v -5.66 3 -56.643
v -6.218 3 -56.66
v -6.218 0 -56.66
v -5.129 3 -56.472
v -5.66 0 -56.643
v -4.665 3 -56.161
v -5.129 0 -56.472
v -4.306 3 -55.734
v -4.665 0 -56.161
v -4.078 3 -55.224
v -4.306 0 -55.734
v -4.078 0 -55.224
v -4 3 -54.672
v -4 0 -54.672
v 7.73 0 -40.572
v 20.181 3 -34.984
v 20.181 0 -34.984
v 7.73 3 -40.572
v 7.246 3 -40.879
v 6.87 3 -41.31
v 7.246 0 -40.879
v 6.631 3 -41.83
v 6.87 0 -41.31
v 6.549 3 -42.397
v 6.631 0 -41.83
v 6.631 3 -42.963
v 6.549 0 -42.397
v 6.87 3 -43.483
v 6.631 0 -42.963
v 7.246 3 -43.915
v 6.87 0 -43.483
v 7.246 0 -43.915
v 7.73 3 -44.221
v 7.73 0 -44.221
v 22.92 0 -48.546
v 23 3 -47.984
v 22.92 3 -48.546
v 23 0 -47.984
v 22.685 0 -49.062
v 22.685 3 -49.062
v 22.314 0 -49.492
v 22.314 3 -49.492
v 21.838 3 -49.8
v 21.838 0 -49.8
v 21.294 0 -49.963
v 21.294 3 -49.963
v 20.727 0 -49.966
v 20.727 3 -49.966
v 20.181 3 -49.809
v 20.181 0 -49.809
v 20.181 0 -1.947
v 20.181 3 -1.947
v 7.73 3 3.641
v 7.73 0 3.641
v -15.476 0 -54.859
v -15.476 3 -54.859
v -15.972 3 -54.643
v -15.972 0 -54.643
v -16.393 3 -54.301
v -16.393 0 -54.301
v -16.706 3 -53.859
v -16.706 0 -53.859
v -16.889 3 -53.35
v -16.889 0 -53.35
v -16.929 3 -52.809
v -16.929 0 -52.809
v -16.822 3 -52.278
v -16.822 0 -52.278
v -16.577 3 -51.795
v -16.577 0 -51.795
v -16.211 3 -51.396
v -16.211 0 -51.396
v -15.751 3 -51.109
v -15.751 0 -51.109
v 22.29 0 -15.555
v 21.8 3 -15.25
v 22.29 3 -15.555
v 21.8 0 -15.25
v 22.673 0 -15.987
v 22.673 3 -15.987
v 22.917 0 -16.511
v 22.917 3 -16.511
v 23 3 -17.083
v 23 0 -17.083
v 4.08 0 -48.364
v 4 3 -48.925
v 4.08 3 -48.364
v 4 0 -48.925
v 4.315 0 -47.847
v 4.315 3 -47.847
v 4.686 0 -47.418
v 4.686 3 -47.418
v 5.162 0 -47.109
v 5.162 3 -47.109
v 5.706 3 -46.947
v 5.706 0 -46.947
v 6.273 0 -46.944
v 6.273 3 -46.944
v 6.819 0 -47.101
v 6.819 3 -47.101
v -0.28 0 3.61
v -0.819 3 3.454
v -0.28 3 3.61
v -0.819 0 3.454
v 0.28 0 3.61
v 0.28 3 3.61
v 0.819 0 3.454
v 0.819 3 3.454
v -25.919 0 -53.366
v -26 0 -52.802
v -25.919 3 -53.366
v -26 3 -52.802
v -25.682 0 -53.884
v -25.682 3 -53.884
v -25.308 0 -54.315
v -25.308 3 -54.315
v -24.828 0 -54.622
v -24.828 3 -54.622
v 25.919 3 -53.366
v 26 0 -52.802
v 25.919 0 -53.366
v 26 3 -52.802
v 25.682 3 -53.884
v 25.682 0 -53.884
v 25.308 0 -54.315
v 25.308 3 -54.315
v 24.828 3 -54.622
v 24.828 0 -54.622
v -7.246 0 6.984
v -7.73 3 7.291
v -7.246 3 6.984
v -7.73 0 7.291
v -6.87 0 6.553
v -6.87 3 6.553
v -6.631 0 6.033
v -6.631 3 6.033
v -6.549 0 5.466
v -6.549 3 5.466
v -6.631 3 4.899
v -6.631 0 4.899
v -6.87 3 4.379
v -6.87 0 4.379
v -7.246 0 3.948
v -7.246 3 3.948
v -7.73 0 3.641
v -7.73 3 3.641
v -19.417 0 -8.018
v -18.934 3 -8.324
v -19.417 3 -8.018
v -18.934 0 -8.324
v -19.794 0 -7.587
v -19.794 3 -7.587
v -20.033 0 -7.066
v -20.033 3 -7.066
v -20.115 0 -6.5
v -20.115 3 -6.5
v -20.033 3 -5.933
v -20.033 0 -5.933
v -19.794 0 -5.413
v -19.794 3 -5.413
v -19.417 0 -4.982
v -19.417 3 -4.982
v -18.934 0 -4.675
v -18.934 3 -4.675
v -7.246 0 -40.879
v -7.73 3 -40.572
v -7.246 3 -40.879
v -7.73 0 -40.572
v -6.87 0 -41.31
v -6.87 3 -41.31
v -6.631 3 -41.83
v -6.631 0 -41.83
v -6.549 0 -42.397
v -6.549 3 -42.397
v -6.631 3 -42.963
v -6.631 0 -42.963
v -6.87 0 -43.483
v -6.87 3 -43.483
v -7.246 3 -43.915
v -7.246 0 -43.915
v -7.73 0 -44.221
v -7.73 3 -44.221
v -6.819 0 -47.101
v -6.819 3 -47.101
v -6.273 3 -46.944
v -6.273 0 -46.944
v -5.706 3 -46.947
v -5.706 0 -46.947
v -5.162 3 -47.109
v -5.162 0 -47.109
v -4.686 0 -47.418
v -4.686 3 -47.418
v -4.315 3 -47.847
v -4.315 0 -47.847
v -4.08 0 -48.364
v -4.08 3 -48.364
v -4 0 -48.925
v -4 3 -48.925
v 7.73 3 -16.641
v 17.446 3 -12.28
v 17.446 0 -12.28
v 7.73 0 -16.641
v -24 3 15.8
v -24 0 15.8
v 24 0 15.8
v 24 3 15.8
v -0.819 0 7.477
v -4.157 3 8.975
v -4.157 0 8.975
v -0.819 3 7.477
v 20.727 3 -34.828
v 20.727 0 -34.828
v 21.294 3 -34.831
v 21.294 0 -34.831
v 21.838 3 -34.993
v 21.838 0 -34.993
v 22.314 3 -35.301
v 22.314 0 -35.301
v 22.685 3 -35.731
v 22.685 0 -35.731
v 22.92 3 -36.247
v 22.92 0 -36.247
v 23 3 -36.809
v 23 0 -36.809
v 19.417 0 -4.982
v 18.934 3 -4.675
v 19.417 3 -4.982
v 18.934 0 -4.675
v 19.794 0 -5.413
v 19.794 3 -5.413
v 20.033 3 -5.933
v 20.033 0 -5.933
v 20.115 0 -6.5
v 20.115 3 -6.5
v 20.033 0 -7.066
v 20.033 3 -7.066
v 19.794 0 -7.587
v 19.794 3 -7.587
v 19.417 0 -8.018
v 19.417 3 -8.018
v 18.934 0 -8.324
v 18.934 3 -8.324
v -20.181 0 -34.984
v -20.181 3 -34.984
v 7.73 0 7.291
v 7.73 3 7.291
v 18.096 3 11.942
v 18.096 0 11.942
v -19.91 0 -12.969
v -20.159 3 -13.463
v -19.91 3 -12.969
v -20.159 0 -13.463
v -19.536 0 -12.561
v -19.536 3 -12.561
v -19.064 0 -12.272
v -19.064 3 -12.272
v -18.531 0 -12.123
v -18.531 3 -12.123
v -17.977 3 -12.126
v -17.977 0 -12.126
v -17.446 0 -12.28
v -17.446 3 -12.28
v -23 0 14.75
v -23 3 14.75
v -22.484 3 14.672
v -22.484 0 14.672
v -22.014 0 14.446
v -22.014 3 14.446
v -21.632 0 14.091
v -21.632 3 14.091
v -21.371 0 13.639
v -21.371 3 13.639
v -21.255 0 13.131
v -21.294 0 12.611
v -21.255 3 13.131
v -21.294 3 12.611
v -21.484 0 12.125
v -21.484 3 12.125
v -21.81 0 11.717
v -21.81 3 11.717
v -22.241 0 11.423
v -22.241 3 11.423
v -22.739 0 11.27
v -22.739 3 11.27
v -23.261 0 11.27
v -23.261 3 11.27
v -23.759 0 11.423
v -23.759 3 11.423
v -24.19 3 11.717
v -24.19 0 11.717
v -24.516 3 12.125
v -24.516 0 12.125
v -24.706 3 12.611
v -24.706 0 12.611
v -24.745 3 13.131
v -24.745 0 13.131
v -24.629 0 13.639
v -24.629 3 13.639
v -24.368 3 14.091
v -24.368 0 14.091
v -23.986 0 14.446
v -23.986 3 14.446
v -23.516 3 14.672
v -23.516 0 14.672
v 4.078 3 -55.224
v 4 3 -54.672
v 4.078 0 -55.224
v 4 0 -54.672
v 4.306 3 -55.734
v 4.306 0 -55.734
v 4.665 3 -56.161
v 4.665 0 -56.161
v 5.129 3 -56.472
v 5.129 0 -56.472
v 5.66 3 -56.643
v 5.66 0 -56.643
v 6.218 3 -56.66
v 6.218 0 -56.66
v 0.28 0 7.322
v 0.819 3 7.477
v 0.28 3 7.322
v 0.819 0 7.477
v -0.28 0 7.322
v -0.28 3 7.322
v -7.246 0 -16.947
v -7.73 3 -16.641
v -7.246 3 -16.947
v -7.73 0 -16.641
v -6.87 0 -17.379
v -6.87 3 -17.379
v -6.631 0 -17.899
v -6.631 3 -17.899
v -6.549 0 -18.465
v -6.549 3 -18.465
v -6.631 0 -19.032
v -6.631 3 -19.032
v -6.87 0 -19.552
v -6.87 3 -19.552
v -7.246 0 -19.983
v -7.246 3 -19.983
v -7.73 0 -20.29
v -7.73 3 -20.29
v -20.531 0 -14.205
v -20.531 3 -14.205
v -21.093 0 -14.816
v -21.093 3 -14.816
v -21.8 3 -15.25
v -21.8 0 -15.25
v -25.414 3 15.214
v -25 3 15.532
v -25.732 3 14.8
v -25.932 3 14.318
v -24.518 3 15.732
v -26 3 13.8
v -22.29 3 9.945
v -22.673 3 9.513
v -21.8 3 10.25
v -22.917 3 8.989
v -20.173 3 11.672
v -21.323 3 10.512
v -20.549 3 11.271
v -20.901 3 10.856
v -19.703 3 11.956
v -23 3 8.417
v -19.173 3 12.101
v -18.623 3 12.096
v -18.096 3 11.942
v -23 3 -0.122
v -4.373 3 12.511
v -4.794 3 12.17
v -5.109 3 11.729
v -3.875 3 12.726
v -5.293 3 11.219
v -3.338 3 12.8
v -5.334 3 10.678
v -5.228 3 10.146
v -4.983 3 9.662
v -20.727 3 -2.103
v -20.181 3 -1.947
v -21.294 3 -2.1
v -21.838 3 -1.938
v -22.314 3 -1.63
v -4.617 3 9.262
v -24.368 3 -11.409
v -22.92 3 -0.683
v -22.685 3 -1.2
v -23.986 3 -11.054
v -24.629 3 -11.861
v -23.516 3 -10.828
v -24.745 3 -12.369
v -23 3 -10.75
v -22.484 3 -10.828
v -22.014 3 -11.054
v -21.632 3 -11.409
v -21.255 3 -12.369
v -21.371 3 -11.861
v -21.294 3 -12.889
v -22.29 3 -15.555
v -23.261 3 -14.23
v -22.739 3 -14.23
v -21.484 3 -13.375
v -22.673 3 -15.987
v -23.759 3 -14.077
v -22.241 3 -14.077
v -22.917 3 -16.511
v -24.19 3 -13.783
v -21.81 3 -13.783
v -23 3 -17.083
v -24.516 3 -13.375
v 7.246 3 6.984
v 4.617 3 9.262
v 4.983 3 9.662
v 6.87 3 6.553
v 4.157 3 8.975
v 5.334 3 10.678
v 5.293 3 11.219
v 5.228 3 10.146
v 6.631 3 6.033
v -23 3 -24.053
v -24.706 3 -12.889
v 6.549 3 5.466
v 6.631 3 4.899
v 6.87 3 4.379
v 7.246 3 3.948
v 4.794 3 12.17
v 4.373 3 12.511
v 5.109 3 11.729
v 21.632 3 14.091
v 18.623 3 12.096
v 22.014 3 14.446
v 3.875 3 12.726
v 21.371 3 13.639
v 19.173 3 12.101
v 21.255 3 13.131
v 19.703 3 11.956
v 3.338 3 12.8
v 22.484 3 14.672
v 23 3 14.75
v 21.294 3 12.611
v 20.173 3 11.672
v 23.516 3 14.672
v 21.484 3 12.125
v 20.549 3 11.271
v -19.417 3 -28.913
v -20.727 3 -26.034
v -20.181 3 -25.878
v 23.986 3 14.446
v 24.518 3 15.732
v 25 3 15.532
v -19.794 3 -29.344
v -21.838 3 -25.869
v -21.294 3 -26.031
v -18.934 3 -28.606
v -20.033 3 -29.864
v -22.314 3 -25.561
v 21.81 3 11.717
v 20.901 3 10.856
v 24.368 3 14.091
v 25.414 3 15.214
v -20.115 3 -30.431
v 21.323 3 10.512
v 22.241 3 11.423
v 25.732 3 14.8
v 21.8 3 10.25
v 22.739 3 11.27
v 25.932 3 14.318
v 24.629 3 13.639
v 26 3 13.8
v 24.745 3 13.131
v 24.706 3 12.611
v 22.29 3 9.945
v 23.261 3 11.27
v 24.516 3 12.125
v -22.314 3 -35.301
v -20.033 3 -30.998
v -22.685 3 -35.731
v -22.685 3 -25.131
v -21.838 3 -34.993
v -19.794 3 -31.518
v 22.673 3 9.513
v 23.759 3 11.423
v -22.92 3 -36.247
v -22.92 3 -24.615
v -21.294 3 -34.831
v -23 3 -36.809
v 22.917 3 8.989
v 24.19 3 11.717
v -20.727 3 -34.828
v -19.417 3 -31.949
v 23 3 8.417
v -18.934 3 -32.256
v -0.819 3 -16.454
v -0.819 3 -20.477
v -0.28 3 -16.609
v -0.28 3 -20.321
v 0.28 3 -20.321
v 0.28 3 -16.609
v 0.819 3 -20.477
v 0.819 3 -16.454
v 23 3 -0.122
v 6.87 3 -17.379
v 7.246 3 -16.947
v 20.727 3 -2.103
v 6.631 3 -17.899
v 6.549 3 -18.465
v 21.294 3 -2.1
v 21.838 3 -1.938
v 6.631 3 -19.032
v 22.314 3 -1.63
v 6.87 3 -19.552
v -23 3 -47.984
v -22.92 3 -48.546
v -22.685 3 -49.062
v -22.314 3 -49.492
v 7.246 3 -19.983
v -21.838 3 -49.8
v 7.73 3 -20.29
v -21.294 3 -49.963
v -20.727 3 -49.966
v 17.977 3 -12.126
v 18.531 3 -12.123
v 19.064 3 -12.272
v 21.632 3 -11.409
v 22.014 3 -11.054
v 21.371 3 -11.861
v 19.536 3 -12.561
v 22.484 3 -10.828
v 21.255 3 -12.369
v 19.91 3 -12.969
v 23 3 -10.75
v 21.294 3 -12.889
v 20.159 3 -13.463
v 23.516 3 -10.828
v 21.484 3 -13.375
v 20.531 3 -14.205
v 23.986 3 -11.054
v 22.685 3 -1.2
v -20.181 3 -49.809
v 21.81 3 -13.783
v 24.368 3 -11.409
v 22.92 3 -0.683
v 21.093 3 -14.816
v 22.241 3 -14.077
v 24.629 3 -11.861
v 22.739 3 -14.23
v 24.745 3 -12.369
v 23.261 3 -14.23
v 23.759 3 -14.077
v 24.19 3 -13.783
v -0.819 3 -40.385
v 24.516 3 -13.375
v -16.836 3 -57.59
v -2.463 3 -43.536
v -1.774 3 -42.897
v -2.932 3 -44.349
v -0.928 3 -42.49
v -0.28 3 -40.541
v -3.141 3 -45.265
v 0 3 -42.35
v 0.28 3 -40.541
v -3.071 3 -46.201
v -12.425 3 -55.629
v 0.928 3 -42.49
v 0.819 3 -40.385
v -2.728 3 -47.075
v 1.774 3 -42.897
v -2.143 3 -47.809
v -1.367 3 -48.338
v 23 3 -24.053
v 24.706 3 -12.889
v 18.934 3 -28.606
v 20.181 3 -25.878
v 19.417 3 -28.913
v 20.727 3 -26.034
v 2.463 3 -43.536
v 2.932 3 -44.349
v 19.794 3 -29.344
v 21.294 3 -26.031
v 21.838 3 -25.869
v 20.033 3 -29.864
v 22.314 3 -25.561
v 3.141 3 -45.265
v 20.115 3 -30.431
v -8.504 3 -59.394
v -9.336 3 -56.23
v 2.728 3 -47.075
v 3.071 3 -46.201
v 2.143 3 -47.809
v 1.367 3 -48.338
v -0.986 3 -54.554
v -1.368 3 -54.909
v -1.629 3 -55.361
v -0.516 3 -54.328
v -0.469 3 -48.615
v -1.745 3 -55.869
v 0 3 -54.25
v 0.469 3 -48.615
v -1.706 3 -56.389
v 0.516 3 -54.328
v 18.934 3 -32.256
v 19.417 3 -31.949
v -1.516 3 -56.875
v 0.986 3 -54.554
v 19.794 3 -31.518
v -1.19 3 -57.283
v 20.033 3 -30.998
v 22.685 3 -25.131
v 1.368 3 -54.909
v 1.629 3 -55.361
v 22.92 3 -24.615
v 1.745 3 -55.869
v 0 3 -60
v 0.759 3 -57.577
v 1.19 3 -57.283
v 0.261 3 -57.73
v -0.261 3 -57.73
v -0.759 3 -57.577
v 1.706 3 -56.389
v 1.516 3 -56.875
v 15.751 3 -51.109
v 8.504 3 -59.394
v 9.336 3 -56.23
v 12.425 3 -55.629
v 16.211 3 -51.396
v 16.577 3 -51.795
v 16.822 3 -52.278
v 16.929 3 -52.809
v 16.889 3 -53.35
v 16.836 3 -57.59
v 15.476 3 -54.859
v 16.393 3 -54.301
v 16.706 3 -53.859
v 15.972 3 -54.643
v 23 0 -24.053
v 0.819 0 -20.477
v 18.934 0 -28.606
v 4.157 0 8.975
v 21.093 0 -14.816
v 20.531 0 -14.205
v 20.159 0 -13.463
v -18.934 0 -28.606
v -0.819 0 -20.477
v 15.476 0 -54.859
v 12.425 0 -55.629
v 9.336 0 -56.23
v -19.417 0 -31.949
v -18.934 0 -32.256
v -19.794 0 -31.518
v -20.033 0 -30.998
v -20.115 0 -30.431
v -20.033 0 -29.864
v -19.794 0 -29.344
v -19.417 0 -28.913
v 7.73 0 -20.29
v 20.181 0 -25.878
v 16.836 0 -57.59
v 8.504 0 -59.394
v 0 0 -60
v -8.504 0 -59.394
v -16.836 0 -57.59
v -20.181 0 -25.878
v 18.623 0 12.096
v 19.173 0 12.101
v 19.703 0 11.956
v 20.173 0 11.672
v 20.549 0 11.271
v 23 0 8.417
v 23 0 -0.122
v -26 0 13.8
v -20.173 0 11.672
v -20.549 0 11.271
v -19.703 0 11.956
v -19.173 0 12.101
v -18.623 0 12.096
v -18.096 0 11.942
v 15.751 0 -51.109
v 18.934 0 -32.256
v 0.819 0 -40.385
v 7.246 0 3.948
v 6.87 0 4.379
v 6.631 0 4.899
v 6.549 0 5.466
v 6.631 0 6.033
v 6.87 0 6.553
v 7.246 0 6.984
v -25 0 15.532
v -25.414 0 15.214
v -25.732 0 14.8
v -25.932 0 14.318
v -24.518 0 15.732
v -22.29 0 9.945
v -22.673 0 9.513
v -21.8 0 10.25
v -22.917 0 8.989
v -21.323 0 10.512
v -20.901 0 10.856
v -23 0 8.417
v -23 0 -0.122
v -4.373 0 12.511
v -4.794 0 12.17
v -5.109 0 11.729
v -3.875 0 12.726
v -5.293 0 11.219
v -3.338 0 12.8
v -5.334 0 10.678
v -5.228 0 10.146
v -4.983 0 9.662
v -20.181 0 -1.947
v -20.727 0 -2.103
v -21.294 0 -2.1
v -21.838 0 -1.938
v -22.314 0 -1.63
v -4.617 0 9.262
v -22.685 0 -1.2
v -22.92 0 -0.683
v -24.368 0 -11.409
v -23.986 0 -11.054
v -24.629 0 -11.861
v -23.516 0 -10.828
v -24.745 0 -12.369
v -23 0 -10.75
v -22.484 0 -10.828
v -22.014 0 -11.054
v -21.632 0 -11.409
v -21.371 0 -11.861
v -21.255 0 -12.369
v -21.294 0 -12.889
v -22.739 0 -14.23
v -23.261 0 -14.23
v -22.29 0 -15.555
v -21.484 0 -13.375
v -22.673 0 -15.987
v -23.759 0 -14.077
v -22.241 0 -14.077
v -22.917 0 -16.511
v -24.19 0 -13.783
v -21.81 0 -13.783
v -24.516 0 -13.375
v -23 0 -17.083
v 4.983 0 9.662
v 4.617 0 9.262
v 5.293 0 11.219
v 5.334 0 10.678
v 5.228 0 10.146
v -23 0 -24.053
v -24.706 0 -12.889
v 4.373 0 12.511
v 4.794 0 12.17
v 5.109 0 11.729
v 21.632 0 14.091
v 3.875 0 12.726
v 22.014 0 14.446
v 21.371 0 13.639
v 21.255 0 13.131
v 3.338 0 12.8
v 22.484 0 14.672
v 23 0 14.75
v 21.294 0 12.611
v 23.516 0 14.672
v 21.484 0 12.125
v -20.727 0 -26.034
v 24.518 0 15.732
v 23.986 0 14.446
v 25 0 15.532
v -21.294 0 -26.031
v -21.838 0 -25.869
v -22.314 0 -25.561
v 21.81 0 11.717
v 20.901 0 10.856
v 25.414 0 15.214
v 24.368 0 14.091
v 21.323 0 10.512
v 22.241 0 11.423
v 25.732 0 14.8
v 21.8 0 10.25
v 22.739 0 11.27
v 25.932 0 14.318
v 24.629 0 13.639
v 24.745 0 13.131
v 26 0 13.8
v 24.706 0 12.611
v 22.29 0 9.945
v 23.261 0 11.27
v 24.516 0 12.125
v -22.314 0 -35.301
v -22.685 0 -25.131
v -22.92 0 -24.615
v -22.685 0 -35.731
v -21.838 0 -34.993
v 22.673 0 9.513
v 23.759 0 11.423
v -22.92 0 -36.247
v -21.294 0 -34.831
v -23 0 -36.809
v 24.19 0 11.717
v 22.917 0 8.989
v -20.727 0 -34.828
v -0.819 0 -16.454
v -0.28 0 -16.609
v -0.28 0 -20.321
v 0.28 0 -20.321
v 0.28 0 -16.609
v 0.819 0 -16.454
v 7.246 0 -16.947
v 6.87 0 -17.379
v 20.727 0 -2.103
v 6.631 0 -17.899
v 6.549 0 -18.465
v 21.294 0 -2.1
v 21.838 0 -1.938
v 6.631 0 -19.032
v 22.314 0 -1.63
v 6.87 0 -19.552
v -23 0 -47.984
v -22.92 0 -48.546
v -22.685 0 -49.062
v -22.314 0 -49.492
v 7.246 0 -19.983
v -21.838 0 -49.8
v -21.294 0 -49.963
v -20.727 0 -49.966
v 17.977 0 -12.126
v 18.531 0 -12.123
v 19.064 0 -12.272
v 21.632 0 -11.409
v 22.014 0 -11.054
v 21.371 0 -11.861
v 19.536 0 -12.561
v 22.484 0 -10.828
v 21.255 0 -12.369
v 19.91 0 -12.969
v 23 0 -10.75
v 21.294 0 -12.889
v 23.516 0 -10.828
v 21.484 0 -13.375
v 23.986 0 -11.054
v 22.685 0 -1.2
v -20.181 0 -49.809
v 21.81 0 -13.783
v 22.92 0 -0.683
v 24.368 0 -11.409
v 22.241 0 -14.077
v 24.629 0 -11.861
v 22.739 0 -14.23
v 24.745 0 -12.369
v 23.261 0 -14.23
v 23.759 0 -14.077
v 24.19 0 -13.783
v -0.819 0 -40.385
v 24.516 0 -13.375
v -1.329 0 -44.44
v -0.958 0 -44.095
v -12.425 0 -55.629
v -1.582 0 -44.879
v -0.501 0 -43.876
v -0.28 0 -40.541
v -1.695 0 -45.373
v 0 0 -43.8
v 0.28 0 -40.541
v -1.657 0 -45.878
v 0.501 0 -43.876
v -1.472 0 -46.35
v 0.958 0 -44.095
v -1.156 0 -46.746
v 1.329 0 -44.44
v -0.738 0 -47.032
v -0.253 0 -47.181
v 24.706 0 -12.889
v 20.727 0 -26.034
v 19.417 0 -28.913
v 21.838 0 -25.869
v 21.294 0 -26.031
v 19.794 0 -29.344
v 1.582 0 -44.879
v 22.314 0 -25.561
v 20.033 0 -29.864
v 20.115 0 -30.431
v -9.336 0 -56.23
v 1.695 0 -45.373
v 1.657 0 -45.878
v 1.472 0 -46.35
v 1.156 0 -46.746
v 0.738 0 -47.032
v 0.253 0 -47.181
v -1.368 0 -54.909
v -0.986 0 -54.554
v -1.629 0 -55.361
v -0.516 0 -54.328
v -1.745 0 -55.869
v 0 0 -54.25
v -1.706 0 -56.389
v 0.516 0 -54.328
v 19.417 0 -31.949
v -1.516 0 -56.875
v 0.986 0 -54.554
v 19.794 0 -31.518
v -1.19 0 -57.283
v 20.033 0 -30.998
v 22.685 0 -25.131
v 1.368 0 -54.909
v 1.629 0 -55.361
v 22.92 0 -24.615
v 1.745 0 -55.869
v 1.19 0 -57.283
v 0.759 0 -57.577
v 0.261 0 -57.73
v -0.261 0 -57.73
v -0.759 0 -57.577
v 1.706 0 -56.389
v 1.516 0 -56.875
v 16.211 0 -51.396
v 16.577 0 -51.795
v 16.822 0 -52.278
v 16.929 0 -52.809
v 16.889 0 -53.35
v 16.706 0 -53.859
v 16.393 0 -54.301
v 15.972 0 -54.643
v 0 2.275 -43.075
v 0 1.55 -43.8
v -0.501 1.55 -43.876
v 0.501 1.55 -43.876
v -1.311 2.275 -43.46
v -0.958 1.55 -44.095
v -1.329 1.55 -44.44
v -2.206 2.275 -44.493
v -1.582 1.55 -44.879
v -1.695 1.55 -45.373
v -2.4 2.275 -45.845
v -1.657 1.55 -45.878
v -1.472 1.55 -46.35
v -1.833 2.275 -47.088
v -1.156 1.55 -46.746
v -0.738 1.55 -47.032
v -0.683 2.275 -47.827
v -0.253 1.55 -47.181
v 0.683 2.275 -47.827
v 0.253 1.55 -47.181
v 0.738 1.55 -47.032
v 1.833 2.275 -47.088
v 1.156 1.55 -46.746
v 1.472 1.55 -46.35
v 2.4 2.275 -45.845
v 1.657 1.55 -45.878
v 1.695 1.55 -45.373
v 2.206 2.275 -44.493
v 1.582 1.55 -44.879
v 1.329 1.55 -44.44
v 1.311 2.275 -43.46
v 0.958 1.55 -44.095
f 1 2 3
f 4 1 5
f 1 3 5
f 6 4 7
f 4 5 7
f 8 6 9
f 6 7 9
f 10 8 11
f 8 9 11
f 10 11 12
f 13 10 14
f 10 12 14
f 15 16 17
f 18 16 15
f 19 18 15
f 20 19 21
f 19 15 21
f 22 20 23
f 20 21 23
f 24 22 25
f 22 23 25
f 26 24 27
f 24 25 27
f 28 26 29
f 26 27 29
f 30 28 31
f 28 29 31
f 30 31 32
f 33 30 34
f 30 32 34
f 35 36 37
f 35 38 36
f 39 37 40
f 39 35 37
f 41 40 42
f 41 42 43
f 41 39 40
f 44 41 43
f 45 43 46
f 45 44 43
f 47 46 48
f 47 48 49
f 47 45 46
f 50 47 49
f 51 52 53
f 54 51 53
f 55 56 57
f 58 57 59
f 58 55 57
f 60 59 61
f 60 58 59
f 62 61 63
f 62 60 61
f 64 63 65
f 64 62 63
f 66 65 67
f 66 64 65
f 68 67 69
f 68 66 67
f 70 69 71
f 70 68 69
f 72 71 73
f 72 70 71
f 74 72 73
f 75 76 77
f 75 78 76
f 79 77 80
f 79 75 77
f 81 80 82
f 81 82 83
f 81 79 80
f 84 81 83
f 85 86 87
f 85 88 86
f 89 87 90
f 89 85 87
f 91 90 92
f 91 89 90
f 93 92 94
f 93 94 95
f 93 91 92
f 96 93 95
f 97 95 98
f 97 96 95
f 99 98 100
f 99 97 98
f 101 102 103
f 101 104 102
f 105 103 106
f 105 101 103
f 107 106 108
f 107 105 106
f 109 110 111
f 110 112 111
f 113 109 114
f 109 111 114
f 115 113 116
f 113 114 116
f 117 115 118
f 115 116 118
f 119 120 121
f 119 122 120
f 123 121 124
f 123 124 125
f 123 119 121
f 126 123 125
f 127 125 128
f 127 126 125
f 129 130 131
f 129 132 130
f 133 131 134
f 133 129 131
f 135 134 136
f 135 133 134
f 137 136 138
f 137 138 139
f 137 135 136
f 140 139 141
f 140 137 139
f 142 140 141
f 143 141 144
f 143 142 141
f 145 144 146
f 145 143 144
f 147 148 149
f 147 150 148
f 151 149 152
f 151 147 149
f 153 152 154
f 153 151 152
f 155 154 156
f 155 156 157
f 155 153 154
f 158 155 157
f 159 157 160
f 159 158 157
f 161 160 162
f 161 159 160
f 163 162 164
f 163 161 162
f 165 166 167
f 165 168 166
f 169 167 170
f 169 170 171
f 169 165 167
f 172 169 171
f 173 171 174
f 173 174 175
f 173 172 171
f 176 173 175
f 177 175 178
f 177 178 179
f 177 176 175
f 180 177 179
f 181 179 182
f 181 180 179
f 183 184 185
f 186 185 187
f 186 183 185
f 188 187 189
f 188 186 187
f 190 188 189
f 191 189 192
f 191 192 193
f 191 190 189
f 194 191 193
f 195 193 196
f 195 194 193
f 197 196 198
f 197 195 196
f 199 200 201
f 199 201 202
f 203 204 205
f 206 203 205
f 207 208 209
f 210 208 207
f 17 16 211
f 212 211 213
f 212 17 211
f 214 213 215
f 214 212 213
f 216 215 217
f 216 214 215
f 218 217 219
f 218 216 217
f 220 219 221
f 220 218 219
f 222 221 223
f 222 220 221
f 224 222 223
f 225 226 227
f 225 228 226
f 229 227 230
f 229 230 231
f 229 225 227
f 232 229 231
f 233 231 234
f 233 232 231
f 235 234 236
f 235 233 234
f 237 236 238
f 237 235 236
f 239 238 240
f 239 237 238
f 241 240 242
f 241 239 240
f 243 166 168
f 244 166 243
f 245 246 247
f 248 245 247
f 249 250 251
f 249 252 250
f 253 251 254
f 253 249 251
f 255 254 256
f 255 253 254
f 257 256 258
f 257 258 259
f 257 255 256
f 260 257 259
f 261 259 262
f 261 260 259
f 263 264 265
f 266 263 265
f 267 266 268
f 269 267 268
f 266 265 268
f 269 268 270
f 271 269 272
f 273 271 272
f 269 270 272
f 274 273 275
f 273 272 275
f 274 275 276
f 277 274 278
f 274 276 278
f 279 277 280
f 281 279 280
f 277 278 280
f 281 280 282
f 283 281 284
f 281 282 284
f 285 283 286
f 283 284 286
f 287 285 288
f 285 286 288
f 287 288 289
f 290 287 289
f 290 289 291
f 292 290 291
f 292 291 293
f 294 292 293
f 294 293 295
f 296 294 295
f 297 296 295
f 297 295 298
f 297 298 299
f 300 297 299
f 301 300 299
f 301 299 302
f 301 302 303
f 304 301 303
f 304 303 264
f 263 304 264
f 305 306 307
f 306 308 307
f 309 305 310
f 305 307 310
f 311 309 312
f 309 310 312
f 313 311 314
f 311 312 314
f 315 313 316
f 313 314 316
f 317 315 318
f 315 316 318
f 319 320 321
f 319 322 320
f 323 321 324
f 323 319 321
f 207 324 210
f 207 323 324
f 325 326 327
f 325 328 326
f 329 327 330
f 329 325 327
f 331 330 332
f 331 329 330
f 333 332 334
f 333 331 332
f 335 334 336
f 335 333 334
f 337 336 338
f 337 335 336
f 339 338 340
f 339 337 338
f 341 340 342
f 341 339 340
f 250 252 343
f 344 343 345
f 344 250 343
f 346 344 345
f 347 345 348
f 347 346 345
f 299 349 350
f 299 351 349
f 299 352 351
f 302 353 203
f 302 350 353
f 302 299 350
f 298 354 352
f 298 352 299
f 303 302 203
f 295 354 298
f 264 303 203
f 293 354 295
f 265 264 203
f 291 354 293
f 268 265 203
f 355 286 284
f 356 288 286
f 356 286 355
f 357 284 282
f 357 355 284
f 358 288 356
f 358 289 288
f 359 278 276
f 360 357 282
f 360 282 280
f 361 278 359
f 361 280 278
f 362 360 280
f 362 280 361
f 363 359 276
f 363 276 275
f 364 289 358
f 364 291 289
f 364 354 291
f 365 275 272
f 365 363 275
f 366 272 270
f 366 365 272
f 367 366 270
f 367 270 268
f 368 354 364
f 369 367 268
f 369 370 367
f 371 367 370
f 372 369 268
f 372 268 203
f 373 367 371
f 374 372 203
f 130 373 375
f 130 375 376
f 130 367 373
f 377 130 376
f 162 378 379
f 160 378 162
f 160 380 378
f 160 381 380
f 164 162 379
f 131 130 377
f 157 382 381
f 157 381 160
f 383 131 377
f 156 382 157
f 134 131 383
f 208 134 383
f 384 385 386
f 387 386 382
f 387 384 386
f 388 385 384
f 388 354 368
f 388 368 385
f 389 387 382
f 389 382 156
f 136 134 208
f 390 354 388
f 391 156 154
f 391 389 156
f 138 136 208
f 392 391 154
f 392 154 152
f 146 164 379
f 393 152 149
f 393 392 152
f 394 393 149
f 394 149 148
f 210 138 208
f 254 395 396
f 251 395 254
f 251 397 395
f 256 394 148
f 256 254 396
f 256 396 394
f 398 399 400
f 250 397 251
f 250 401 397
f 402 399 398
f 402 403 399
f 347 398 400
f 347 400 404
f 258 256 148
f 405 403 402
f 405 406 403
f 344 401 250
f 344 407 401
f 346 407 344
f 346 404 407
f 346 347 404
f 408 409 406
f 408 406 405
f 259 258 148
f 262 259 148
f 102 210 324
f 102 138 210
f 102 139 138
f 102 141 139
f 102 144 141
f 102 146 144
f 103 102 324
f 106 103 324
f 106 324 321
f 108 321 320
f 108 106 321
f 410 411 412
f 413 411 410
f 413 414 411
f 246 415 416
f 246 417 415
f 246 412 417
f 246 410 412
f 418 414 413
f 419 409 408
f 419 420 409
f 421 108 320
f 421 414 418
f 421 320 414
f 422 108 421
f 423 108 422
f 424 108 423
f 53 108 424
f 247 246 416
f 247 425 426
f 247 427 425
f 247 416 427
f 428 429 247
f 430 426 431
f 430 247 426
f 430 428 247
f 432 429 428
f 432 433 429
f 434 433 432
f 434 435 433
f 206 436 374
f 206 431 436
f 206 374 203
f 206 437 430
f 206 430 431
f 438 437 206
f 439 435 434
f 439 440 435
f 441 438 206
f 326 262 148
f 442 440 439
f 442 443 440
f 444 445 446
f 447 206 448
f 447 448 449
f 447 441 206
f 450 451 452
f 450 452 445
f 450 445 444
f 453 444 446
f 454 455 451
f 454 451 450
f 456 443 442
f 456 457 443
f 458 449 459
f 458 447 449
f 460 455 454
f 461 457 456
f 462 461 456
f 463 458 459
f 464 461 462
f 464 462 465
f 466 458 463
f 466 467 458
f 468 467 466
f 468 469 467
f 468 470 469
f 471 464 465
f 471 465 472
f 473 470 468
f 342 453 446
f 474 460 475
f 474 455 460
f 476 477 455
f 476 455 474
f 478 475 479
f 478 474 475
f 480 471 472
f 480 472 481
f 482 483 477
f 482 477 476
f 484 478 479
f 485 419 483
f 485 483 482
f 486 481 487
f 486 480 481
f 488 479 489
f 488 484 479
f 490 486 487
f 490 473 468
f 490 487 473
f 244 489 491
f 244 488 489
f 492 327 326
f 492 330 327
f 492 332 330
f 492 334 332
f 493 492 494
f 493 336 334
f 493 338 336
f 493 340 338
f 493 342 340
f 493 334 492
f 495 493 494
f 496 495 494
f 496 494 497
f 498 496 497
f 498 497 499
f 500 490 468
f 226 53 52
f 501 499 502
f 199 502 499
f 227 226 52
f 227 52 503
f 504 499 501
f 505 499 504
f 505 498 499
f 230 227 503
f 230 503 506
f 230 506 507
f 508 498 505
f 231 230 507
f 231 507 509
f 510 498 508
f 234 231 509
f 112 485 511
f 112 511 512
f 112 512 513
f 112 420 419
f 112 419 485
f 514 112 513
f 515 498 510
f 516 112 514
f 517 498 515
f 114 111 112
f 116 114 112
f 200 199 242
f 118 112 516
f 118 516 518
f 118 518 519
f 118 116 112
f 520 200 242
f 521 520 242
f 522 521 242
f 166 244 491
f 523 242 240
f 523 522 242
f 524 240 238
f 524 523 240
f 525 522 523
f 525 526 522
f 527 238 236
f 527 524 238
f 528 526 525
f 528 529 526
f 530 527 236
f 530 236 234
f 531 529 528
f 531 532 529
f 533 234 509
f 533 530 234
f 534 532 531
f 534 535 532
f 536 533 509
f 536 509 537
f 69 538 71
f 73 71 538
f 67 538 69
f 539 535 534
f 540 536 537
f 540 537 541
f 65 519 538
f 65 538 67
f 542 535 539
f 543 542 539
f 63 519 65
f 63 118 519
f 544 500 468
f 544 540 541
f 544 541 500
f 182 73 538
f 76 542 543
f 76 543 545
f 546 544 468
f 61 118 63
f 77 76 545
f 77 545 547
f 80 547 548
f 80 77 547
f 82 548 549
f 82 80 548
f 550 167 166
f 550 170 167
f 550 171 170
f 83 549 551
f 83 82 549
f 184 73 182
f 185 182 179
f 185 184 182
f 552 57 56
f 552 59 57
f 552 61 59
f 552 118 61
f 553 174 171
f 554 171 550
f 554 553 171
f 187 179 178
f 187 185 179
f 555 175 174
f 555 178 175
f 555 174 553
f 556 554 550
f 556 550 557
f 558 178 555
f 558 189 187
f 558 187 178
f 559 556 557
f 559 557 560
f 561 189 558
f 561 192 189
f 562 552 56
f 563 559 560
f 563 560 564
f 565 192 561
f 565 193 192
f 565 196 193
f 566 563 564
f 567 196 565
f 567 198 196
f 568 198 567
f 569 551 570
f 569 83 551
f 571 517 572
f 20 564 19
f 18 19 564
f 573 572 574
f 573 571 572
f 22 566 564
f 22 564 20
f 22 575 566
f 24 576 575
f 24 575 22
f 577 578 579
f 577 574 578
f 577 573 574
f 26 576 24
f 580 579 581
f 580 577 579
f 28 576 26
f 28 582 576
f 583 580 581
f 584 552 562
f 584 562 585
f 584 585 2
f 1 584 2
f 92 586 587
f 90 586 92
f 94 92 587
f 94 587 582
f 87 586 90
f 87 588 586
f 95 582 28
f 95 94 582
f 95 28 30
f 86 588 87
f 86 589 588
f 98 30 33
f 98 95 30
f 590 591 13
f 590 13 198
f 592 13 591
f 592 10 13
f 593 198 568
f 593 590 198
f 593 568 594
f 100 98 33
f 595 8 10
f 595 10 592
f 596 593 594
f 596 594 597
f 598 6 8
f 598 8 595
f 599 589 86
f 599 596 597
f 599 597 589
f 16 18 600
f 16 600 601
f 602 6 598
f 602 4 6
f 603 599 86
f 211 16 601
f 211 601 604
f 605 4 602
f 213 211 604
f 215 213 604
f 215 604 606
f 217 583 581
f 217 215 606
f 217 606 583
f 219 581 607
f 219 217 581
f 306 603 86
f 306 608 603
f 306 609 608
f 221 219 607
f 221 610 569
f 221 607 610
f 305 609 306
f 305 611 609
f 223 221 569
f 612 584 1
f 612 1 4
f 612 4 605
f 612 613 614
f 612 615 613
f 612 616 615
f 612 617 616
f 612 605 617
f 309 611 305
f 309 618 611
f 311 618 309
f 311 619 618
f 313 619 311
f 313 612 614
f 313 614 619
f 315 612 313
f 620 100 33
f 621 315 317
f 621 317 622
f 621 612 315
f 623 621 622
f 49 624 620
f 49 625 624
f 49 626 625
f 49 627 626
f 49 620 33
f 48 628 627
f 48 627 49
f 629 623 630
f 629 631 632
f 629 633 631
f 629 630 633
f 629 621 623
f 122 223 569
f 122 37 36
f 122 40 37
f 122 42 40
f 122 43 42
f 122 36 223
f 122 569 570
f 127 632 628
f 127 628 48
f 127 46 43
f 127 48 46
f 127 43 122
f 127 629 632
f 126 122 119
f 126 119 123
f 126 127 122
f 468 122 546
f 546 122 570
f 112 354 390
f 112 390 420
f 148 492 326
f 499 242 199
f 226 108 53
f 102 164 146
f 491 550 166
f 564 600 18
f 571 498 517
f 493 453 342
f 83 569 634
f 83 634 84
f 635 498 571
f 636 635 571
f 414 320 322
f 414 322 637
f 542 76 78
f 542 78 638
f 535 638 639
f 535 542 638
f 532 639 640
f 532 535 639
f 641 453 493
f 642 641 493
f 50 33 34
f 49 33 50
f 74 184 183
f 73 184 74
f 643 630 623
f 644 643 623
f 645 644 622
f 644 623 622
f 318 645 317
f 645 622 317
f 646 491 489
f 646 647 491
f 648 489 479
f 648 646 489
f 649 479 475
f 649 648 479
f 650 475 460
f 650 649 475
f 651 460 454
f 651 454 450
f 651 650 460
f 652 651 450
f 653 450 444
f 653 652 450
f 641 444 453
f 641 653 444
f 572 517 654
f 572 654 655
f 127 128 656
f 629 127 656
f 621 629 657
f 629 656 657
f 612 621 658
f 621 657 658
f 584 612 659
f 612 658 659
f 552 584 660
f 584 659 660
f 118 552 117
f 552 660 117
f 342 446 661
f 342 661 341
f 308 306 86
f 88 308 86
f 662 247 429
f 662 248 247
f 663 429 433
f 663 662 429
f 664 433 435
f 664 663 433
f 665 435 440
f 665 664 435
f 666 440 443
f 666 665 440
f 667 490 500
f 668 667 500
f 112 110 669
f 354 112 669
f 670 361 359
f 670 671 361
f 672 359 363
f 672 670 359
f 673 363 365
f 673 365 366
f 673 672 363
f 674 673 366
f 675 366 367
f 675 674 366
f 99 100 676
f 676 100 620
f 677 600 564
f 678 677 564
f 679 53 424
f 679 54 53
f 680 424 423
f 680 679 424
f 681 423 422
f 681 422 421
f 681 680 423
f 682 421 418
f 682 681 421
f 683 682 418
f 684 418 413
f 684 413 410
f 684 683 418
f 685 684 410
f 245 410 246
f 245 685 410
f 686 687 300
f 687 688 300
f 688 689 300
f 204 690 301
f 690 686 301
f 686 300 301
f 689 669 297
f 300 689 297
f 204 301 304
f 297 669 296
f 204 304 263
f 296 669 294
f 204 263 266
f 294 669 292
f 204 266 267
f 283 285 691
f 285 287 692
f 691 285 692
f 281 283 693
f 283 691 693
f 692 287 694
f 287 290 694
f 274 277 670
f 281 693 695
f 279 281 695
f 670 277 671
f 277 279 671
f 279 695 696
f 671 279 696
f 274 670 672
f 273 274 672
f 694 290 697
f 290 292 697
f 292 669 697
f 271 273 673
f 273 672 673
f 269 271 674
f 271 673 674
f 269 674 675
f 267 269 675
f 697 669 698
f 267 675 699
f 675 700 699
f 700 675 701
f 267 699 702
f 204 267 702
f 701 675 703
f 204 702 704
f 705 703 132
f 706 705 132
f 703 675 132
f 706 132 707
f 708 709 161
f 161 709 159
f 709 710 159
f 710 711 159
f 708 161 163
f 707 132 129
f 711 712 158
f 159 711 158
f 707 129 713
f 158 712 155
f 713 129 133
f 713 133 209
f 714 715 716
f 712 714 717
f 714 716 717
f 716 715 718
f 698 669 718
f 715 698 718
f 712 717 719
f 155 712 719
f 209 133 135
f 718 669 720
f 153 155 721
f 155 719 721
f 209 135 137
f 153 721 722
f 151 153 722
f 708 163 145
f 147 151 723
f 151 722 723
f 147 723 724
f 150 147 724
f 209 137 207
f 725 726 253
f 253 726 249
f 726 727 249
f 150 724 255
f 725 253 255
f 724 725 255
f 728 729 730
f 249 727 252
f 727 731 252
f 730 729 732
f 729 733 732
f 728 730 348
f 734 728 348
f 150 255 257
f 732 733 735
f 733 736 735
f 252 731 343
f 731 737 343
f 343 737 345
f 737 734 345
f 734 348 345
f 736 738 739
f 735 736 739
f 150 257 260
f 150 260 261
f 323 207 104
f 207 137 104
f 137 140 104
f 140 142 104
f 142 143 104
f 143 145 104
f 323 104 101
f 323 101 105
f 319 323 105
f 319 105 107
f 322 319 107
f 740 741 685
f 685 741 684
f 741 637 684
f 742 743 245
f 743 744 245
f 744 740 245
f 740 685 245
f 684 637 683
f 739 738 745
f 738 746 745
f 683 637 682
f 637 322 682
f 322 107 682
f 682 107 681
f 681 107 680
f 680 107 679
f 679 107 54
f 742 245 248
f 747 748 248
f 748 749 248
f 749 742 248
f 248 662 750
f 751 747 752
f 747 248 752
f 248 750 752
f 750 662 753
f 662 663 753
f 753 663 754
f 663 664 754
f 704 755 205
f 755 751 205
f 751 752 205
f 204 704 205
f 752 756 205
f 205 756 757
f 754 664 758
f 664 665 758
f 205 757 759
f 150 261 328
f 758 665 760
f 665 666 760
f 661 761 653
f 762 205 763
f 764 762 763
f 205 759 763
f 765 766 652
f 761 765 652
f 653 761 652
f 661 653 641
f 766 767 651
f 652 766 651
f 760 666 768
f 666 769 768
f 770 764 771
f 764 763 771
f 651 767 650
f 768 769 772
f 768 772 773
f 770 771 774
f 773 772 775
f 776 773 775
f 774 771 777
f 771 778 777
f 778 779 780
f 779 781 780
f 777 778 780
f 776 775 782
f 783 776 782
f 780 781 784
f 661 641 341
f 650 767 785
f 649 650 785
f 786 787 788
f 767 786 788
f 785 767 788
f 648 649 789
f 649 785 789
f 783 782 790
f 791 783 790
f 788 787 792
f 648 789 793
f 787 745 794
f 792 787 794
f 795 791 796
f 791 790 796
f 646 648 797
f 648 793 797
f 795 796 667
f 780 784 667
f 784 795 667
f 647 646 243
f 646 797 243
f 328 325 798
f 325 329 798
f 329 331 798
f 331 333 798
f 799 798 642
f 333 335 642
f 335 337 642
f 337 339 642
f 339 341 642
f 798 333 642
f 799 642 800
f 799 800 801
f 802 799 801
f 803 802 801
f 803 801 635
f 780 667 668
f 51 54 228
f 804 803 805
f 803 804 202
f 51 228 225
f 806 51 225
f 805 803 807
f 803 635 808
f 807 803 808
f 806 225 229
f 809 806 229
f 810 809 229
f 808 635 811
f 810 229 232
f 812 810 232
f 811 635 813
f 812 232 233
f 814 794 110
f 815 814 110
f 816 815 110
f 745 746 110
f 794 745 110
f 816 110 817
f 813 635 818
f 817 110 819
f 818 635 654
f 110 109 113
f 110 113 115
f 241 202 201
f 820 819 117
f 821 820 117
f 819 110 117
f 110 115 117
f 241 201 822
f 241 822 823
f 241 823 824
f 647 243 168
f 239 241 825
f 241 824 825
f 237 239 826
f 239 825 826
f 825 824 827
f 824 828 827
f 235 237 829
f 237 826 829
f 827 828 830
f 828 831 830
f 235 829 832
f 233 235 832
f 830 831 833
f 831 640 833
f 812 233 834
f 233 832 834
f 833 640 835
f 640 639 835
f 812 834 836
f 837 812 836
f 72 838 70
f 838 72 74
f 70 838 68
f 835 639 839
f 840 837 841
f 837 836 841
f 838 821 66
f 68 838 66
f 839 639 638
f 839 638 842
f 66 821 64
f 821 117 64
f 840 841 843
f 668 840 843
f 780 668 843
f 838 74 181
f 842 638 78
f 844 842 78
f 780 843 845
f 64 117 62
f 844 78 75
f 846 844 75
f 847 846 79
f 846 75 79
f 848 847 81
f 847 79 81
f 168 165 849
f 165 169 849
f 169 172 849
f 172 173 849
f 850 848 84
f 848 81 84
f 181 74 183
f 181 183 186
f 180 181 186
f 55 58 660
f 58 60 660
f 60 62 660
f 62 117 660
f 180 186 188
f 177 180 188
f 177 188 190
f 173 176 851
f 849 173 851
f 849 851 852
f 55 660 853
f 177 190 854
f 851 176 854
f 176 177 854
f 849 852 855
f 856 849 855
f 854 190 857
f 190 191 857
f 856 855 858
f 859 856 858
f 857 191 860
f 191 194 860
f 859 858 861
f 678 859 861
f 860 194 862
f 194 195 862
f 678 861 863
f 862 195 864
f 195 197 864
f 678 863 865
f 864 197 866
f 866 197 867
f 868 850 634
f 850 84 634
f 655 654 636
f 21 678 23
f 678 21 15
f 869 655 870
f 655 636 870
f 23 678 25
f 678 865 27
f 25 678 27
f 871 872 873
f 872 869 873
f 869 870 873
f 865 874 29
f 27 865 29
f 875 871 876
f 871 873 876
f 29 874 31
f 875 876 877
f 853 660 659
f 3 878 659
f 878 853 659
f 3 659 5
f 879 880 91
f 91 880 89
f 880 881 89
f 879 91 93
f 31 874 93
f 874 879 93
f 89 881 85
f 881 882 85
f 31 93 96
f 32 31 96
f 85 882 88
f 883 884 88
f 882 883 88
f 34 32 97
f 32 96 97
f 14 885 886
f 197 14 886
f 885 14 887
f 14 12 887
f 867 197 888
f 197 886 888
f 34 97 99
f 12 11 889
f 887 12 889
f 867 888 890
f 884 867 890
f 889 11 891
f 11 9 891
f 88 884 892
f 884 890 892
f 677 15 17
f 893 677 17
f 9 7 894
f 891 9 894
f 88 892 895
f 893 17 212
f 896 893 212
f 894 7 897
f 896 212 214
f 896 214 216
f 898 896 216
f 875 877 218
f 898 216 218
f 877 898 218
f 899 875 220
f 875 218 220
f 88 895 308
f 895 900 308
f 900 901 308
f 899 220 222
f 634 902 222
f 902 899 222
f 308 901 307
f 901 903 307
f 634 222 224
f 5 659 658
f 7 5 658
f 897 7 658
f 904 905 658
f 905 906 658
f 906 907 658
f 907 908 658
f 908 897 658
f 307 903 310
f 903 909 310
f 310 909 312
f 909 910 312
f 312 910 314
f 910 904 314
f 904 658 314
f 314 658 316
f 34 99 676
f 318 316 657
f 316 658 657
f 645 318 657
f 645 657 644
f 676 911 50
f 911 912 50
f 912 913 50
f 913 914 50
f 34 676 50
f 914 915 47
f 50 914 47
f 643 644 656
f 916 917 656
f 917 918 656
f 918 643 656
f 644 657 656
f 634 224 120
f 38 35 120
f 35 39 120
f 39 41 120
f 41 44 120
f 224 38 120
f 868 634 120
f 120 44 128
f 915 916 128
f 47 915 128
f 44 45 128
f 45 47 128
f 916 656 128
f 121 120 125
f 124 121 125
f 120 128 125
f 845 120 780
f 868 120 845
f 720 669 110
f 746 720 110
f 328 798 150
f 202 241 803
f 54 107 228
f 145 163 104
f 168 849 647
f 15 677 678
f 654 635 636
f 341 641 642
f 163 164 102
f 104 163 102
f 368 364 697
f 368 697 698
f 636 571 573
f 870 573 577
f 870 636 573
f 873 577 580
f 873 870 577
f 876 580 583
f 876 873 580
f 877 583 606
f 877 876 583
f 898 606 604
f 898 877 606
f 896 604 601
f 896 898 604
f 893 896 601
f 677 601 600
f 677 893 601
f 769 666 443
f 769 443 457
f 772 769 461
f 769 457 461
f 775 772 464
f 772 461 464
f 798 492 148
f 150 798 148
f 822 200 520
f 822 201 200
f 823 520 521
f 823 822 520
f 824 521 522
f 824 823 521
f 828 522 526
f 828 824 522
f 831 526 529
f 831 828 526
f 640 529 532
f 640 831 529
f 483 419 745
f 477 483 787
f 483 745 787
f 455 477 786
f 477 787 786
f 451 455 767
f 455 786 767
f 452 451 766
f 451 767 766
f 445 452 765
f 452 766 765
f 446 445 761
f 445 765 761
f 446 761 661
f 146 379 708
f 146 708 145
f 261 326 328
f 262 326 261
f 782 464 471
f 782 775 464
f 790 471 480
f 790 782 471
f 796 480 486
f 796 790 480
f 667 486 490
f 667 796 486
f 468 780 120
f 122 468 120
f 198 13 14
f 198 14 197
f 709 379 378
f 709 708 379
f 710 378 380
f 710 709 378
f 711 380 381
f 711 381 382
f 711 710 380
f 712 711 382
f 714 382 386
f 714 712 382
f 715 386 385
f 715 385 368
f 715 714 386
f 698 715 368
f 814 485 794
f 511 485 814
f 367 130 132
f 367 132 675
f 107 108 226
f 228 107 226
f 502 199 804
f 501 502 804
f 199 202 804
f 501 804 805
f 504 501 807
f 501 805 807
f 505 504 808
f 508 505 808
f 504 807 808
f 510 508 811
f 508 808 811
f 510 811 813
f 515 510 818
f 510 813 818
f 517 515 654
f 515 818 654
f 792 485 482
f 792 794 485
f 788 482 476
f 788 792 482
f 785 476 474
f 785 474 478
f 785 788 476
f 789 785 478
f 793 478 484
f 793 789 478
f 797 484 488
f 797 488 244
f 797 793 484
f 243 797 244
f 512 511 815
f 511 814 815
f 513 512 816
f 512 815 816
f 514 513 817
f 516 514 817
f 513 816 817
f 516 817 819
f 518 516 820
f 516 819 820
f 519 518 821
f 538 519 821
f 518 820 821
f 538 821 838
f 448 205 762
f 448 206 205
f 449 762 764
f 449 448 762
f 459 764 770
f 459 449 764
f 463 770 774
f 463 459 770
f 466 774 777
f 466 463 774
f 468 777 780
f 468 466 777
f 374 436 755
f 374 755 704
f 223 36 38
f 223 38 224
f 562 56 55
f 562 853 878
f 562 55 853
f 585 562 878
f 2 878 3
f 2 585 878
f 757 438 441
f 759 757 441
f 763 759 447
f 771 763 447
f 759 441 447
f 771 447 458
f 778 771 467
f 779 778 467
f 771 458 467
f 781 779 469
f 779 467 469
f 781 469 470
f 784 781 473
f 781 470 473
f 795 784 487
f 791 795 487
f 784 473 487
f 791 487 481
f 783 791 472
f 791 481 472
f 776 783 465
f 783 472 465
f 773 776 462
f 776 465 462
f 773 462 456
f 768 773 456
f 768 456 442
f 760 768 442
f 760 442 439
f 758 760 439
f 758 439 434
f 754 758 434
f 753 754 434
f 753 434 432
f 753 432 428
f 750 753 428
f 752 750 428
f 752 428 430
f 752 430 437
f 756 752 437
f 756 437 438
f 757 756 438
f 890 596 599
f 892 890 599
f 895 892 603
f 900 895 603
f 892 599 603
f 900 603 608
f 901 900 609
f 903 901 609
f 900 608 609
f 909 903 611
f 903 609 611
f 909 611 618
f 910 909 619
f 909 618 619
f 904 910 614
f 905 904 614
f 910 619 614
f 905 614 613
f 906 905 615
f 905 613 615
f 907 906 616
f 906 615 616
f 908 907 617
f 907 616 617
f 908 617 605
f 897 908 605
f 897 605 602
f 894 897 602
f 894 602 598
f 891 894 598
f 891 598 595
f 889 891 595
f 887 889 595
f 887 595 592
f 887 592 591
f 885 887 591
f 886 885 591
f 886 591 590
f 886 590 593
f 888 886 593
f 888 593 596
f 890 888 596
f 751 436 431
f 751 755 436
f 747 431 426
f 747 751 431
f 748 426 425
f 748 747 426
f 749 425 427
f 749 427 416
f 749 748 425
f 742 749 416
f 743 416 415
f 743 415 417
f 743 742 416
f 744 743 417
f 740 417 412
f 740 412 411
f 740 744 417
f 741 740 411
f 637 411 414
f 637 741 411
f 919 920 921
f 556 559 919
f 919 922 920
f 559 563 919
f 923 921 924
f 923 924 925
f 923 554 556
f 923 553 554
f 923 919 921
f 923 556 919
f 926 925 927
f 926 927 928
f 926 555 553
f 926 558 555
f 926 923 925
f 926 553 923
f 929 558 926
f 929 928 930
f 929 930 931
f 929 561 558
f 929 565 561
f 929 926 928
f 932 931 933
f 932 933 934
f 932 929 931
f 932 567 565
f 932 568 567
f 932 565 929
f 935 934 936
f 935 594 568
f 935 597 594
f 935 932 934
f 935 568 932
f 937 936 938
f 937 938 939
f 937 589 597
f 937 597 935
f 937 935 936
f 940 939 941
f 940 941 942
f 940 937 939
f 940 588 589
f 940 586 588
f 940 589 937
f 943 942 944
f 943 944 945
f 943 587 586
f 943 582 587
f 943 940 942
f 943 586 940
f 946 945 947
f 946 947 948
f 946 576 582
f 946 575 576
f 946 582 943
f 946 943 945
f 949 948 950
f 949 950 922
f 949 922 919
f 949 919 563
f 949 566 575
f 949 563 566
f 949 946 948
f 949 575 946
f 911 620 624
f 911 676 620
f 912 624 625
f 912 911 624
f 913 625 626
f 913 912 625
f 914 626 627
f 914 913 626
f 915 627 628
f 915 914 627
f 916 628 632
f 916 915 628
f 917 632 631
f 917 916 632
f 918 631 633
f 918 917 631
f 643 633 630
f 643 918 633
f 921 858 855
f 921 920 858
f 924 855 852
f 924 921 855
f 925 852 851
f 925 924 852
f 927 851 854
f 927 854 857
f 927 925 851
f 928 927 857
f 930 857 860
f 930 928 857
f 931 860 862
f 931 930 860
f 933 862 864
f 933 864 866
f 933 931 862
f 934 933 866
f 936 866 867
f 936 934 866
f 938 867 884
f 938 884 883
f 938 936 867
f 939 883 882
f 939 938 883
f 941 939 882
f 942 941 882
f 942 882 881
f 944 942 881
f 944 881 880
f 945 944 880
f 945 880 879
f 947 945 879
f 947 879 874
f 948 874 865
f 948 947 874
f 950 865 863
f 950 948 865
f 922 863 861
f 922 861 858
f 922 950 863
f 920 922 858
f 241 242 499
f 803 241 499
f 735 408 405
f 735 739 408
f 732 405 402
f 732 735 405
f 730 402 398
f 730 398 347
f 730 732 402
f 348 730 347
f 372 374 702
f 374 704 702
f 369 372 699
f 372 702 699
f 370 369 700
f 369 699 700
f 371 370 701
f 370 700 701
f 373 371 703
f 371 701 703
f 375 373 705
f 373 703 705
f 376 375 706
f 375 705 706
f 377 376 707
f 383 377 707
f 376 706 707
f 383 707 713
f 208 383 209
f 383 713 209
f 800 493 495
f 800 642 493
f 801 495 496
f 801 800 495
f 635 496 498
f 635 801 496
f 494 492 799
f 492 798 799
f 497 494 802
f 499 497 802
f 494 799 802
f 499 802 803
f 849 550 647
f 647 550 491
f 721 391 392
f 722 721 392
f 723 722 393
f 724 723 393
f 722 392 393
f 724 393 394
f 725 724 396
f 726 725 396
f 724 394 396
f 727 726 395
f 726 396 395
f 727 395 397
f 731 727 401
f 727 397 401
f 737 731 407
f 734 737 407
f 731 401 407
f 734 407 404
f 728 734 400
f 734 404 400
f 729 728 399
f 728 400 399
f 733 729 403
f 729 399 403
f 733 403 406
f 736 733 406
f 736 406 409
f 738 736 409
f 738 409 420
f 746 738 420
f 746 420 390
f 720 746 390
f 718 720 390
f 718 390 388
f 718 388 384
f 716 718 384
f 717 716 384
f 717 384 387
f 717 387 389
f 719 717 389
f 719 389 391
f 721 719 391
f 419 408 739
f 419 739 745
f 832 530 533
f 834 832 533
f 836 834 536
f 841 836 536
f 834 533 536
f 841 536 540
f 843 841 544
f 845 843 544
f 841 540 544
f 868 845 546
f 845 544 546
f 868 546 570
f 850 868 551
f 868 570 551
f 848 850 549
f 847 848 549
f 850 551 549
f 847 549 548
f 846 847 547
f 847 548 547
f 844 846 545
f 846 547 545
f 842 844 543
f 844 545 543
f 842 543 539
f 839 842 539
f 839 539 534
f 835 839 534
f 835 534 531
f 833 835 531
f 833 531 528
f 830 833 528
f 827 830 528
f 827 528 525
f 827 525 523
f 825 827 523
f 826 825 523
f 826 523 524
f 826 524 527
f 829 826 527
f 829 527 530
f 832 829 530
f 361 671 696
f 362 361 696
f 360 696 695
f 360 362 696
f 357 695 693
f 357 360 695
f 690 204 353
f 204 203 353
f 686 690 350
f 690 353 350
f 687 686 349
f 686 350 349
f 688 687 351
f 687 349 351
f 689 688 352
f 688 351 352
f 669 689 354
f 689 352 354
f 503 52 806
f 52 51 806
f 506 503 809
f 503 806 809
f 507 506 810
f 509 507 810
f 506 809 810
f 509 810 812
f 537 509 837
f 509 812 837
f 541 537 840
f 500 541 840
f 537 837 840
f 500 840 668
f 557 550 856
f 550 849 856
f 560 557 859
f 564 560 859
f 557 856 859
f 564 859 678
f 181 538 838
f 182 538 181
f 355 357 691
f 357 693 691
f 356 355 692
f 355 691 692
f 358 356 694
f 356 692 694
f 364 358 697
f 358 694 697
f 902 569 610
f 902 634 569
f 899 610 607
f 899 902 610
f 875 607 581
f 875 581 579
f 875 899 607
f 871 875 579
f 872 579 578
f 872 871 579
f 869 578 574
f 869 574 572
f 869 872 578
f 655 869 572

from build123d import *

# Parameters (mm, degrees)
BOSS_EXTRUDE1_DEPTH = 3
SKETCH2_R           = 1.75
CUT_EXTRUDE1_DEPTH  = 66.459911396
SKETCH3_R           = 1.75
CUT_EXTRUDE2_DEPTH  = 66.459911396
CUT_EXTRUDE3_DEPTH  = 66.459911396
FILLET1_R           = 2


with BuildPart() as part:
    # Sketch1 → Boss-Extrude1 (new body)
    with BuildSketch(Plane(origin=(0, 0, 0), x_dir=(1, 0, 0), z_dir=(0, 1, 0))):
        with BuildLine():
            Line((-26, -15.8), (26, -15.8))
            Line((26, -15.8), (26, 54.074023338))
            ThreePointArc((26, 54.074023338), (0, 60), (-26, 54.074023338))
            Line((-26, 54.074023338), (-26, -15.8))
        make_face()
    extrude(amount=BOSS_EXTRUDE1_DEPTH)

    # Sketch2 → Cut-Extrude1 (cut, through all)
    with BuildSketch(Plane(origin=(0, 3, 0), x_dir=(1, 0, 0), z_dir=(0, 1, 0))):
        with Locations(Location((-23, -13, 0), (0, 0, 270))):
            Circle(SKETCH2_R)
        with Locations(Location((-23, 12.5, 0), (0, 0, 270))):
            Circle(SKETCH2_R)
        with Locations(Location((23, -13, 0), (0, 0, 270))):
            Circle(SKETCH2_R)
        with Locations(Location((23, 12.5, 0), (0, 0, 270))):
            Circle(SKETCH2_R)
    extrude(amount=-CUT_EXTRUDE1_DEPTH, mode=Mode.SUBTRACT)

    # Sketch3 → Cut-Extrude2 (cut, through all)
    with BuildSketch(Plane(origin=(0, 3, 0), x_dir=(1, 0, 0), z_dir=(0, 1, 0))):
        with Locations(Location((0, 56, 0), (0, 0, 270))):
            Circle(SKETCH3_R)
    extrude(amount=-CUT_EXTRUDE2_DEPTH, mode=Mode.SUBTRACT)

    # Sketch4 → Cut-Extrude3 (cut, through all)
    with BuildSketch(Plane(origin=(0, 3, 0), x_dir=(1, 0, 0), z_dir=(0, 1, 0))):
        with BuildLine():
            Line((-4, 56.859475903), (-4, 45.835789761))
            Line((-4, 45.835789761), (-20.43478188, 53.211086152))
            ThreePointArc((-20.43478188, 53.211086152), (-12.352826734, 55.645374216), (-4, 56.859475903))
        make_face()
        with BuildLine():
            Line((4, 56.859475903), (4, 45.835789761))
            Line((4, 45.835789761), (20.43478188, 53.211086152))
            ThreePointArc((20.43478188, 53.211086152), (12.352826734, 55.645374216), (4, 56.859475903))
        make_face()
        Polygon((-23, 51.074023338), (-3.66367684, 42.396627103), (-23, 33.719230867), align=None)
        Polygon((3.66367684, 42.396627103), (23, 51.074023338), (23, 33.719230867), align=None)
        Polygon((0, 40.752510206), (-23, 30.430997074), (0, 20.109483942), (23, 30.430997074), align=None)
        with BuildLine():
            Line((-23, 27.142763282), (-3.66367684, 18.465367046))
            Line((-3.66367684, 18.465367046), (-20.439245255, 10.937138798))
            ThreePointArc((-20.439245255, 10.937138798), (-20.383840257, 13.968233019), (-23, 15.5))
            Line((-23, 15.5), (-23, 27.142763282))
        make_face()
        with BuildLine():
            Line((3.66367684, 18.465367046), (23, 27.142763282))
            Line((23, 27.142763282), (23, 15.5))
            ThreePointArc((23, 15.5), (20.383840257, 13.968233019), (20.439245255, 10.937138798))
            Line((20.439245255, 10.937138798), (3.66367684, 18.465367046))
        make_face()
        Polygon((0, 16.821250149), (-23, 6.499737017), (0, -3.821776115), (23, 6.499737017), align=None)
        with BuildLine():
            Line((23, 3.211503225), (3.66367684, -5.465893011))
            Line((3.66367684, -5.465893011), (20.006674091, -12.8))
            ThreePointArc((20.006674091, -12.8), (20.950609847, -10.80910977), (23, -10))
            Line((23, -10), (23, 3.211503225))
        make_face()
        with BuildLine():
            Line((-23, -10), (-23, 3.211503225))
            Line((-23, 3.211503225), (-3.66367684, -5.465893011))
            Line((-3.66367684, -5.465893011), (-20.006674091, -12.8))
            ThreePointArc((-20.006674091, -12.8), (-20.950609847, -10.80910977), (-23, -10))
        make_face()
        Polygon((-12.679320411, -12.8), (0, -7.110009907), (12.679320411, -12.8), align=None)
    extrude(amount=-CUT_EXTRUDE3_DEPTH, mode=Mode.SUBTRACT)

    # Fillet1
    fillet1_edges = [part.edges().sort_by_distance(p)[0] for p in [
        (20.439245255, 1.5, -10.937138798),
        (3.66367684, 1.5, -18.465367046),
        (23, 1.5, -27.142763282),
        (23, 1.5, -15.5),
        (0, 1.5, -16.821250149),
        (23, 1.5, -6.499737017),
        (0, 1.5, 3.821776115),
        (-23, 1.5, -6.499737017),
        (23, 1.5, -3.211503225),
        (23, 1.5, 10),
        (20.006674091, 1.5, 12.8),
        (3.66367684, 1.5, 5.465893011),
        (-20.006674091, 1.5, 12.8),
        (-23, 1.5, 10),
        (-23, 1.5, -3.211503225),
        (-3.66367684, 1.5, 5.465893011),
        (12.679320411, 1.5, 12.8),
        (-12.679320411, 1.5, 12.8),
        (0, 1.5, 7.110009907),
        (4, 1.5, -56.859475903),
        (20.43478188, 1.5, -53.211086152),
        (4, 1.5, -45.835789761),
        (-20.43478188, 1.5, -53.211086152),
        (-4, 1.5, -56.859475903),
        (-4, 1.5, -45.835789761),
        (-23, 1.5, -33.719230867),
        (-23, 1.5, -51.074023338),
        (-3.66367684, 1.5, -42.396627103),
        (23, 1.5, -33.719230867),
        (3.66367684, 1.5, -42.396627103),
        (23, 1.5, -51.074023338),
        (-26, 1.5, -54.074023338),
        (26, 1.5, -54.074023338),
        (26, 1.5, 15.8),
        (-26, 1.5, 15.8),
        (0, 1.5, -40.752510206),
        (23, 1.5, -30.430997074),
        (0, 1.5, -20.109483942),
        (-23, 1.5, -30.430997074),
        (-23, 1.5, -15.5),
        (-23, 1.5, -27.142763282),
        (-3.66367684, 1.5, -18.465367046),
        (-20.439245255, 1.5, -10.937138798),
    ]]
    fillet(fillet1_edges, radius=FILLET1_R)

    # Sketch5 → CSK for M3 Countersunk Flat Head Screw1 (revolve, cut)
    with BuildSketch(Plane(origin=(0, 3, -45.5), x_dir=(0, 0, 1), z_dir=(1, 0, 0))):
        Polygon((0, 0), (0, 3), (1.7, 3), (1.7, 1.45), (3.15, 0), align=None)
    revolve(axis=Axis((0, 9.35, -45.5), (0, -1, 0)), mode=Mode.SUBTRACT)


solid = part.part
